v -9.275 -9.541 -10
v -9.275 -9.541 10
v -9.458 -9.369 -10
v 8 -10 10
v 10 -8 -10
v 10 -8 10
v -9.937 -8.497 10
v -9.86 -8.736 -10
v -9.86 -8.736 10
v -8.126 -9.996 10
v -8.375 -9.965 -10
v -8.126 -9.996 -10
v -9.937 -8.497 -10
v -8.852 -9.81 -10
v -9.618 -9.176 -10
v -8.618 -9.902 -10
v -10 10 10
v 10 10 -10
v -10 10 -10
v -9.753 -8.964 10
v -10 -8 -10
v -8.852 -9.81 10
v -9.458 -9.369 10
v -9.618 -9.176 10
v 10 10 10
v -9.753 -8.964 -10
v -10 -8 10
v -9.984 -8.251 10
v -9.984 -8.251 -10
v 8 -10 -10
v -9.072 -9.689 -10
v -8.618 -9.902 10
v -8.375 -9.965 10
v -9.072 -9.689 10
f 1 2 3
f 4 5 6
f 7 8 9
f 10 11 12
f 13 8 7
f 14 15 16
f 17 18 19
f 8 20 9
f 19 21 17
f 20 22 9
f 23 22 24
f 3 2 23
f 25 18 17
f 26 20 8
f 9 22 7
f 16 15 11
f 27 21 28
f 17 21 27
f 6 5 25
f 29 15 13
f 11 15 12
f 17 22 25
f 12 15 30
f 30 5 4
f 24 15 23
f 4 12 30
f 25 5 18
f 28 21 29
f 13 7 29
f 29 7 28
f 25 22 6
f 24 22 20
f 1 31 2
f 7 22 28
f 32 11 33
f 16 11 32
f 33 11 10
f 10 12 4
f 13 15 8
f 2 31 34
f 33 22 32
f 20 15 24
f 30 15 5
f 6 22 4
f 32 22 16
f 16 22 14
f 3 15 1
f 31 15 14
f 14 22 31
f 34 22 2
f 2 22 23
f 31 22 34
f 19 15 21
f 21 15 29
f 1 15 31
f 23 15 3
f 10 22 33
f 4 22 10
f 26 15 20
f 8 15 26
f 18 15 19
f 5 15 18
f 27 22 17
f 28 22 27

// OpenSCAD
x=0;
y=1;
z=0;


// para mertos del cubo
size = [20,20,10];
radio = 2;

// coordenadas de la esquina cuadrante 1
xc = size[x]/2 - radio;
yc = size[y]/2 - radio;
zc = size[z]/2;


col_size = [2*radio,2*radio,size[z]];

// tamaño de las columnas cuadradas
vertex = [
	[xc,yc,0],
	[-xc,yc,0],
	[-xc,-yc,0],
	[xc,-yc,0]
];


module example1(){
	hull(){
		for(v = [0:1]){
			translate(vertex[v])
				cube(col_size,center =true);
				//cylinder(r=r,h=size[z],center=true,$fn=4);
			translate(vertex[2])
				cylinder(r=radio,h=size[z],center=true,$fn=50);
			translate(vertex[3])
				cylinder(r=radio,h=size[z],center=true,$fn=4);
		}
	}
}

example1();
